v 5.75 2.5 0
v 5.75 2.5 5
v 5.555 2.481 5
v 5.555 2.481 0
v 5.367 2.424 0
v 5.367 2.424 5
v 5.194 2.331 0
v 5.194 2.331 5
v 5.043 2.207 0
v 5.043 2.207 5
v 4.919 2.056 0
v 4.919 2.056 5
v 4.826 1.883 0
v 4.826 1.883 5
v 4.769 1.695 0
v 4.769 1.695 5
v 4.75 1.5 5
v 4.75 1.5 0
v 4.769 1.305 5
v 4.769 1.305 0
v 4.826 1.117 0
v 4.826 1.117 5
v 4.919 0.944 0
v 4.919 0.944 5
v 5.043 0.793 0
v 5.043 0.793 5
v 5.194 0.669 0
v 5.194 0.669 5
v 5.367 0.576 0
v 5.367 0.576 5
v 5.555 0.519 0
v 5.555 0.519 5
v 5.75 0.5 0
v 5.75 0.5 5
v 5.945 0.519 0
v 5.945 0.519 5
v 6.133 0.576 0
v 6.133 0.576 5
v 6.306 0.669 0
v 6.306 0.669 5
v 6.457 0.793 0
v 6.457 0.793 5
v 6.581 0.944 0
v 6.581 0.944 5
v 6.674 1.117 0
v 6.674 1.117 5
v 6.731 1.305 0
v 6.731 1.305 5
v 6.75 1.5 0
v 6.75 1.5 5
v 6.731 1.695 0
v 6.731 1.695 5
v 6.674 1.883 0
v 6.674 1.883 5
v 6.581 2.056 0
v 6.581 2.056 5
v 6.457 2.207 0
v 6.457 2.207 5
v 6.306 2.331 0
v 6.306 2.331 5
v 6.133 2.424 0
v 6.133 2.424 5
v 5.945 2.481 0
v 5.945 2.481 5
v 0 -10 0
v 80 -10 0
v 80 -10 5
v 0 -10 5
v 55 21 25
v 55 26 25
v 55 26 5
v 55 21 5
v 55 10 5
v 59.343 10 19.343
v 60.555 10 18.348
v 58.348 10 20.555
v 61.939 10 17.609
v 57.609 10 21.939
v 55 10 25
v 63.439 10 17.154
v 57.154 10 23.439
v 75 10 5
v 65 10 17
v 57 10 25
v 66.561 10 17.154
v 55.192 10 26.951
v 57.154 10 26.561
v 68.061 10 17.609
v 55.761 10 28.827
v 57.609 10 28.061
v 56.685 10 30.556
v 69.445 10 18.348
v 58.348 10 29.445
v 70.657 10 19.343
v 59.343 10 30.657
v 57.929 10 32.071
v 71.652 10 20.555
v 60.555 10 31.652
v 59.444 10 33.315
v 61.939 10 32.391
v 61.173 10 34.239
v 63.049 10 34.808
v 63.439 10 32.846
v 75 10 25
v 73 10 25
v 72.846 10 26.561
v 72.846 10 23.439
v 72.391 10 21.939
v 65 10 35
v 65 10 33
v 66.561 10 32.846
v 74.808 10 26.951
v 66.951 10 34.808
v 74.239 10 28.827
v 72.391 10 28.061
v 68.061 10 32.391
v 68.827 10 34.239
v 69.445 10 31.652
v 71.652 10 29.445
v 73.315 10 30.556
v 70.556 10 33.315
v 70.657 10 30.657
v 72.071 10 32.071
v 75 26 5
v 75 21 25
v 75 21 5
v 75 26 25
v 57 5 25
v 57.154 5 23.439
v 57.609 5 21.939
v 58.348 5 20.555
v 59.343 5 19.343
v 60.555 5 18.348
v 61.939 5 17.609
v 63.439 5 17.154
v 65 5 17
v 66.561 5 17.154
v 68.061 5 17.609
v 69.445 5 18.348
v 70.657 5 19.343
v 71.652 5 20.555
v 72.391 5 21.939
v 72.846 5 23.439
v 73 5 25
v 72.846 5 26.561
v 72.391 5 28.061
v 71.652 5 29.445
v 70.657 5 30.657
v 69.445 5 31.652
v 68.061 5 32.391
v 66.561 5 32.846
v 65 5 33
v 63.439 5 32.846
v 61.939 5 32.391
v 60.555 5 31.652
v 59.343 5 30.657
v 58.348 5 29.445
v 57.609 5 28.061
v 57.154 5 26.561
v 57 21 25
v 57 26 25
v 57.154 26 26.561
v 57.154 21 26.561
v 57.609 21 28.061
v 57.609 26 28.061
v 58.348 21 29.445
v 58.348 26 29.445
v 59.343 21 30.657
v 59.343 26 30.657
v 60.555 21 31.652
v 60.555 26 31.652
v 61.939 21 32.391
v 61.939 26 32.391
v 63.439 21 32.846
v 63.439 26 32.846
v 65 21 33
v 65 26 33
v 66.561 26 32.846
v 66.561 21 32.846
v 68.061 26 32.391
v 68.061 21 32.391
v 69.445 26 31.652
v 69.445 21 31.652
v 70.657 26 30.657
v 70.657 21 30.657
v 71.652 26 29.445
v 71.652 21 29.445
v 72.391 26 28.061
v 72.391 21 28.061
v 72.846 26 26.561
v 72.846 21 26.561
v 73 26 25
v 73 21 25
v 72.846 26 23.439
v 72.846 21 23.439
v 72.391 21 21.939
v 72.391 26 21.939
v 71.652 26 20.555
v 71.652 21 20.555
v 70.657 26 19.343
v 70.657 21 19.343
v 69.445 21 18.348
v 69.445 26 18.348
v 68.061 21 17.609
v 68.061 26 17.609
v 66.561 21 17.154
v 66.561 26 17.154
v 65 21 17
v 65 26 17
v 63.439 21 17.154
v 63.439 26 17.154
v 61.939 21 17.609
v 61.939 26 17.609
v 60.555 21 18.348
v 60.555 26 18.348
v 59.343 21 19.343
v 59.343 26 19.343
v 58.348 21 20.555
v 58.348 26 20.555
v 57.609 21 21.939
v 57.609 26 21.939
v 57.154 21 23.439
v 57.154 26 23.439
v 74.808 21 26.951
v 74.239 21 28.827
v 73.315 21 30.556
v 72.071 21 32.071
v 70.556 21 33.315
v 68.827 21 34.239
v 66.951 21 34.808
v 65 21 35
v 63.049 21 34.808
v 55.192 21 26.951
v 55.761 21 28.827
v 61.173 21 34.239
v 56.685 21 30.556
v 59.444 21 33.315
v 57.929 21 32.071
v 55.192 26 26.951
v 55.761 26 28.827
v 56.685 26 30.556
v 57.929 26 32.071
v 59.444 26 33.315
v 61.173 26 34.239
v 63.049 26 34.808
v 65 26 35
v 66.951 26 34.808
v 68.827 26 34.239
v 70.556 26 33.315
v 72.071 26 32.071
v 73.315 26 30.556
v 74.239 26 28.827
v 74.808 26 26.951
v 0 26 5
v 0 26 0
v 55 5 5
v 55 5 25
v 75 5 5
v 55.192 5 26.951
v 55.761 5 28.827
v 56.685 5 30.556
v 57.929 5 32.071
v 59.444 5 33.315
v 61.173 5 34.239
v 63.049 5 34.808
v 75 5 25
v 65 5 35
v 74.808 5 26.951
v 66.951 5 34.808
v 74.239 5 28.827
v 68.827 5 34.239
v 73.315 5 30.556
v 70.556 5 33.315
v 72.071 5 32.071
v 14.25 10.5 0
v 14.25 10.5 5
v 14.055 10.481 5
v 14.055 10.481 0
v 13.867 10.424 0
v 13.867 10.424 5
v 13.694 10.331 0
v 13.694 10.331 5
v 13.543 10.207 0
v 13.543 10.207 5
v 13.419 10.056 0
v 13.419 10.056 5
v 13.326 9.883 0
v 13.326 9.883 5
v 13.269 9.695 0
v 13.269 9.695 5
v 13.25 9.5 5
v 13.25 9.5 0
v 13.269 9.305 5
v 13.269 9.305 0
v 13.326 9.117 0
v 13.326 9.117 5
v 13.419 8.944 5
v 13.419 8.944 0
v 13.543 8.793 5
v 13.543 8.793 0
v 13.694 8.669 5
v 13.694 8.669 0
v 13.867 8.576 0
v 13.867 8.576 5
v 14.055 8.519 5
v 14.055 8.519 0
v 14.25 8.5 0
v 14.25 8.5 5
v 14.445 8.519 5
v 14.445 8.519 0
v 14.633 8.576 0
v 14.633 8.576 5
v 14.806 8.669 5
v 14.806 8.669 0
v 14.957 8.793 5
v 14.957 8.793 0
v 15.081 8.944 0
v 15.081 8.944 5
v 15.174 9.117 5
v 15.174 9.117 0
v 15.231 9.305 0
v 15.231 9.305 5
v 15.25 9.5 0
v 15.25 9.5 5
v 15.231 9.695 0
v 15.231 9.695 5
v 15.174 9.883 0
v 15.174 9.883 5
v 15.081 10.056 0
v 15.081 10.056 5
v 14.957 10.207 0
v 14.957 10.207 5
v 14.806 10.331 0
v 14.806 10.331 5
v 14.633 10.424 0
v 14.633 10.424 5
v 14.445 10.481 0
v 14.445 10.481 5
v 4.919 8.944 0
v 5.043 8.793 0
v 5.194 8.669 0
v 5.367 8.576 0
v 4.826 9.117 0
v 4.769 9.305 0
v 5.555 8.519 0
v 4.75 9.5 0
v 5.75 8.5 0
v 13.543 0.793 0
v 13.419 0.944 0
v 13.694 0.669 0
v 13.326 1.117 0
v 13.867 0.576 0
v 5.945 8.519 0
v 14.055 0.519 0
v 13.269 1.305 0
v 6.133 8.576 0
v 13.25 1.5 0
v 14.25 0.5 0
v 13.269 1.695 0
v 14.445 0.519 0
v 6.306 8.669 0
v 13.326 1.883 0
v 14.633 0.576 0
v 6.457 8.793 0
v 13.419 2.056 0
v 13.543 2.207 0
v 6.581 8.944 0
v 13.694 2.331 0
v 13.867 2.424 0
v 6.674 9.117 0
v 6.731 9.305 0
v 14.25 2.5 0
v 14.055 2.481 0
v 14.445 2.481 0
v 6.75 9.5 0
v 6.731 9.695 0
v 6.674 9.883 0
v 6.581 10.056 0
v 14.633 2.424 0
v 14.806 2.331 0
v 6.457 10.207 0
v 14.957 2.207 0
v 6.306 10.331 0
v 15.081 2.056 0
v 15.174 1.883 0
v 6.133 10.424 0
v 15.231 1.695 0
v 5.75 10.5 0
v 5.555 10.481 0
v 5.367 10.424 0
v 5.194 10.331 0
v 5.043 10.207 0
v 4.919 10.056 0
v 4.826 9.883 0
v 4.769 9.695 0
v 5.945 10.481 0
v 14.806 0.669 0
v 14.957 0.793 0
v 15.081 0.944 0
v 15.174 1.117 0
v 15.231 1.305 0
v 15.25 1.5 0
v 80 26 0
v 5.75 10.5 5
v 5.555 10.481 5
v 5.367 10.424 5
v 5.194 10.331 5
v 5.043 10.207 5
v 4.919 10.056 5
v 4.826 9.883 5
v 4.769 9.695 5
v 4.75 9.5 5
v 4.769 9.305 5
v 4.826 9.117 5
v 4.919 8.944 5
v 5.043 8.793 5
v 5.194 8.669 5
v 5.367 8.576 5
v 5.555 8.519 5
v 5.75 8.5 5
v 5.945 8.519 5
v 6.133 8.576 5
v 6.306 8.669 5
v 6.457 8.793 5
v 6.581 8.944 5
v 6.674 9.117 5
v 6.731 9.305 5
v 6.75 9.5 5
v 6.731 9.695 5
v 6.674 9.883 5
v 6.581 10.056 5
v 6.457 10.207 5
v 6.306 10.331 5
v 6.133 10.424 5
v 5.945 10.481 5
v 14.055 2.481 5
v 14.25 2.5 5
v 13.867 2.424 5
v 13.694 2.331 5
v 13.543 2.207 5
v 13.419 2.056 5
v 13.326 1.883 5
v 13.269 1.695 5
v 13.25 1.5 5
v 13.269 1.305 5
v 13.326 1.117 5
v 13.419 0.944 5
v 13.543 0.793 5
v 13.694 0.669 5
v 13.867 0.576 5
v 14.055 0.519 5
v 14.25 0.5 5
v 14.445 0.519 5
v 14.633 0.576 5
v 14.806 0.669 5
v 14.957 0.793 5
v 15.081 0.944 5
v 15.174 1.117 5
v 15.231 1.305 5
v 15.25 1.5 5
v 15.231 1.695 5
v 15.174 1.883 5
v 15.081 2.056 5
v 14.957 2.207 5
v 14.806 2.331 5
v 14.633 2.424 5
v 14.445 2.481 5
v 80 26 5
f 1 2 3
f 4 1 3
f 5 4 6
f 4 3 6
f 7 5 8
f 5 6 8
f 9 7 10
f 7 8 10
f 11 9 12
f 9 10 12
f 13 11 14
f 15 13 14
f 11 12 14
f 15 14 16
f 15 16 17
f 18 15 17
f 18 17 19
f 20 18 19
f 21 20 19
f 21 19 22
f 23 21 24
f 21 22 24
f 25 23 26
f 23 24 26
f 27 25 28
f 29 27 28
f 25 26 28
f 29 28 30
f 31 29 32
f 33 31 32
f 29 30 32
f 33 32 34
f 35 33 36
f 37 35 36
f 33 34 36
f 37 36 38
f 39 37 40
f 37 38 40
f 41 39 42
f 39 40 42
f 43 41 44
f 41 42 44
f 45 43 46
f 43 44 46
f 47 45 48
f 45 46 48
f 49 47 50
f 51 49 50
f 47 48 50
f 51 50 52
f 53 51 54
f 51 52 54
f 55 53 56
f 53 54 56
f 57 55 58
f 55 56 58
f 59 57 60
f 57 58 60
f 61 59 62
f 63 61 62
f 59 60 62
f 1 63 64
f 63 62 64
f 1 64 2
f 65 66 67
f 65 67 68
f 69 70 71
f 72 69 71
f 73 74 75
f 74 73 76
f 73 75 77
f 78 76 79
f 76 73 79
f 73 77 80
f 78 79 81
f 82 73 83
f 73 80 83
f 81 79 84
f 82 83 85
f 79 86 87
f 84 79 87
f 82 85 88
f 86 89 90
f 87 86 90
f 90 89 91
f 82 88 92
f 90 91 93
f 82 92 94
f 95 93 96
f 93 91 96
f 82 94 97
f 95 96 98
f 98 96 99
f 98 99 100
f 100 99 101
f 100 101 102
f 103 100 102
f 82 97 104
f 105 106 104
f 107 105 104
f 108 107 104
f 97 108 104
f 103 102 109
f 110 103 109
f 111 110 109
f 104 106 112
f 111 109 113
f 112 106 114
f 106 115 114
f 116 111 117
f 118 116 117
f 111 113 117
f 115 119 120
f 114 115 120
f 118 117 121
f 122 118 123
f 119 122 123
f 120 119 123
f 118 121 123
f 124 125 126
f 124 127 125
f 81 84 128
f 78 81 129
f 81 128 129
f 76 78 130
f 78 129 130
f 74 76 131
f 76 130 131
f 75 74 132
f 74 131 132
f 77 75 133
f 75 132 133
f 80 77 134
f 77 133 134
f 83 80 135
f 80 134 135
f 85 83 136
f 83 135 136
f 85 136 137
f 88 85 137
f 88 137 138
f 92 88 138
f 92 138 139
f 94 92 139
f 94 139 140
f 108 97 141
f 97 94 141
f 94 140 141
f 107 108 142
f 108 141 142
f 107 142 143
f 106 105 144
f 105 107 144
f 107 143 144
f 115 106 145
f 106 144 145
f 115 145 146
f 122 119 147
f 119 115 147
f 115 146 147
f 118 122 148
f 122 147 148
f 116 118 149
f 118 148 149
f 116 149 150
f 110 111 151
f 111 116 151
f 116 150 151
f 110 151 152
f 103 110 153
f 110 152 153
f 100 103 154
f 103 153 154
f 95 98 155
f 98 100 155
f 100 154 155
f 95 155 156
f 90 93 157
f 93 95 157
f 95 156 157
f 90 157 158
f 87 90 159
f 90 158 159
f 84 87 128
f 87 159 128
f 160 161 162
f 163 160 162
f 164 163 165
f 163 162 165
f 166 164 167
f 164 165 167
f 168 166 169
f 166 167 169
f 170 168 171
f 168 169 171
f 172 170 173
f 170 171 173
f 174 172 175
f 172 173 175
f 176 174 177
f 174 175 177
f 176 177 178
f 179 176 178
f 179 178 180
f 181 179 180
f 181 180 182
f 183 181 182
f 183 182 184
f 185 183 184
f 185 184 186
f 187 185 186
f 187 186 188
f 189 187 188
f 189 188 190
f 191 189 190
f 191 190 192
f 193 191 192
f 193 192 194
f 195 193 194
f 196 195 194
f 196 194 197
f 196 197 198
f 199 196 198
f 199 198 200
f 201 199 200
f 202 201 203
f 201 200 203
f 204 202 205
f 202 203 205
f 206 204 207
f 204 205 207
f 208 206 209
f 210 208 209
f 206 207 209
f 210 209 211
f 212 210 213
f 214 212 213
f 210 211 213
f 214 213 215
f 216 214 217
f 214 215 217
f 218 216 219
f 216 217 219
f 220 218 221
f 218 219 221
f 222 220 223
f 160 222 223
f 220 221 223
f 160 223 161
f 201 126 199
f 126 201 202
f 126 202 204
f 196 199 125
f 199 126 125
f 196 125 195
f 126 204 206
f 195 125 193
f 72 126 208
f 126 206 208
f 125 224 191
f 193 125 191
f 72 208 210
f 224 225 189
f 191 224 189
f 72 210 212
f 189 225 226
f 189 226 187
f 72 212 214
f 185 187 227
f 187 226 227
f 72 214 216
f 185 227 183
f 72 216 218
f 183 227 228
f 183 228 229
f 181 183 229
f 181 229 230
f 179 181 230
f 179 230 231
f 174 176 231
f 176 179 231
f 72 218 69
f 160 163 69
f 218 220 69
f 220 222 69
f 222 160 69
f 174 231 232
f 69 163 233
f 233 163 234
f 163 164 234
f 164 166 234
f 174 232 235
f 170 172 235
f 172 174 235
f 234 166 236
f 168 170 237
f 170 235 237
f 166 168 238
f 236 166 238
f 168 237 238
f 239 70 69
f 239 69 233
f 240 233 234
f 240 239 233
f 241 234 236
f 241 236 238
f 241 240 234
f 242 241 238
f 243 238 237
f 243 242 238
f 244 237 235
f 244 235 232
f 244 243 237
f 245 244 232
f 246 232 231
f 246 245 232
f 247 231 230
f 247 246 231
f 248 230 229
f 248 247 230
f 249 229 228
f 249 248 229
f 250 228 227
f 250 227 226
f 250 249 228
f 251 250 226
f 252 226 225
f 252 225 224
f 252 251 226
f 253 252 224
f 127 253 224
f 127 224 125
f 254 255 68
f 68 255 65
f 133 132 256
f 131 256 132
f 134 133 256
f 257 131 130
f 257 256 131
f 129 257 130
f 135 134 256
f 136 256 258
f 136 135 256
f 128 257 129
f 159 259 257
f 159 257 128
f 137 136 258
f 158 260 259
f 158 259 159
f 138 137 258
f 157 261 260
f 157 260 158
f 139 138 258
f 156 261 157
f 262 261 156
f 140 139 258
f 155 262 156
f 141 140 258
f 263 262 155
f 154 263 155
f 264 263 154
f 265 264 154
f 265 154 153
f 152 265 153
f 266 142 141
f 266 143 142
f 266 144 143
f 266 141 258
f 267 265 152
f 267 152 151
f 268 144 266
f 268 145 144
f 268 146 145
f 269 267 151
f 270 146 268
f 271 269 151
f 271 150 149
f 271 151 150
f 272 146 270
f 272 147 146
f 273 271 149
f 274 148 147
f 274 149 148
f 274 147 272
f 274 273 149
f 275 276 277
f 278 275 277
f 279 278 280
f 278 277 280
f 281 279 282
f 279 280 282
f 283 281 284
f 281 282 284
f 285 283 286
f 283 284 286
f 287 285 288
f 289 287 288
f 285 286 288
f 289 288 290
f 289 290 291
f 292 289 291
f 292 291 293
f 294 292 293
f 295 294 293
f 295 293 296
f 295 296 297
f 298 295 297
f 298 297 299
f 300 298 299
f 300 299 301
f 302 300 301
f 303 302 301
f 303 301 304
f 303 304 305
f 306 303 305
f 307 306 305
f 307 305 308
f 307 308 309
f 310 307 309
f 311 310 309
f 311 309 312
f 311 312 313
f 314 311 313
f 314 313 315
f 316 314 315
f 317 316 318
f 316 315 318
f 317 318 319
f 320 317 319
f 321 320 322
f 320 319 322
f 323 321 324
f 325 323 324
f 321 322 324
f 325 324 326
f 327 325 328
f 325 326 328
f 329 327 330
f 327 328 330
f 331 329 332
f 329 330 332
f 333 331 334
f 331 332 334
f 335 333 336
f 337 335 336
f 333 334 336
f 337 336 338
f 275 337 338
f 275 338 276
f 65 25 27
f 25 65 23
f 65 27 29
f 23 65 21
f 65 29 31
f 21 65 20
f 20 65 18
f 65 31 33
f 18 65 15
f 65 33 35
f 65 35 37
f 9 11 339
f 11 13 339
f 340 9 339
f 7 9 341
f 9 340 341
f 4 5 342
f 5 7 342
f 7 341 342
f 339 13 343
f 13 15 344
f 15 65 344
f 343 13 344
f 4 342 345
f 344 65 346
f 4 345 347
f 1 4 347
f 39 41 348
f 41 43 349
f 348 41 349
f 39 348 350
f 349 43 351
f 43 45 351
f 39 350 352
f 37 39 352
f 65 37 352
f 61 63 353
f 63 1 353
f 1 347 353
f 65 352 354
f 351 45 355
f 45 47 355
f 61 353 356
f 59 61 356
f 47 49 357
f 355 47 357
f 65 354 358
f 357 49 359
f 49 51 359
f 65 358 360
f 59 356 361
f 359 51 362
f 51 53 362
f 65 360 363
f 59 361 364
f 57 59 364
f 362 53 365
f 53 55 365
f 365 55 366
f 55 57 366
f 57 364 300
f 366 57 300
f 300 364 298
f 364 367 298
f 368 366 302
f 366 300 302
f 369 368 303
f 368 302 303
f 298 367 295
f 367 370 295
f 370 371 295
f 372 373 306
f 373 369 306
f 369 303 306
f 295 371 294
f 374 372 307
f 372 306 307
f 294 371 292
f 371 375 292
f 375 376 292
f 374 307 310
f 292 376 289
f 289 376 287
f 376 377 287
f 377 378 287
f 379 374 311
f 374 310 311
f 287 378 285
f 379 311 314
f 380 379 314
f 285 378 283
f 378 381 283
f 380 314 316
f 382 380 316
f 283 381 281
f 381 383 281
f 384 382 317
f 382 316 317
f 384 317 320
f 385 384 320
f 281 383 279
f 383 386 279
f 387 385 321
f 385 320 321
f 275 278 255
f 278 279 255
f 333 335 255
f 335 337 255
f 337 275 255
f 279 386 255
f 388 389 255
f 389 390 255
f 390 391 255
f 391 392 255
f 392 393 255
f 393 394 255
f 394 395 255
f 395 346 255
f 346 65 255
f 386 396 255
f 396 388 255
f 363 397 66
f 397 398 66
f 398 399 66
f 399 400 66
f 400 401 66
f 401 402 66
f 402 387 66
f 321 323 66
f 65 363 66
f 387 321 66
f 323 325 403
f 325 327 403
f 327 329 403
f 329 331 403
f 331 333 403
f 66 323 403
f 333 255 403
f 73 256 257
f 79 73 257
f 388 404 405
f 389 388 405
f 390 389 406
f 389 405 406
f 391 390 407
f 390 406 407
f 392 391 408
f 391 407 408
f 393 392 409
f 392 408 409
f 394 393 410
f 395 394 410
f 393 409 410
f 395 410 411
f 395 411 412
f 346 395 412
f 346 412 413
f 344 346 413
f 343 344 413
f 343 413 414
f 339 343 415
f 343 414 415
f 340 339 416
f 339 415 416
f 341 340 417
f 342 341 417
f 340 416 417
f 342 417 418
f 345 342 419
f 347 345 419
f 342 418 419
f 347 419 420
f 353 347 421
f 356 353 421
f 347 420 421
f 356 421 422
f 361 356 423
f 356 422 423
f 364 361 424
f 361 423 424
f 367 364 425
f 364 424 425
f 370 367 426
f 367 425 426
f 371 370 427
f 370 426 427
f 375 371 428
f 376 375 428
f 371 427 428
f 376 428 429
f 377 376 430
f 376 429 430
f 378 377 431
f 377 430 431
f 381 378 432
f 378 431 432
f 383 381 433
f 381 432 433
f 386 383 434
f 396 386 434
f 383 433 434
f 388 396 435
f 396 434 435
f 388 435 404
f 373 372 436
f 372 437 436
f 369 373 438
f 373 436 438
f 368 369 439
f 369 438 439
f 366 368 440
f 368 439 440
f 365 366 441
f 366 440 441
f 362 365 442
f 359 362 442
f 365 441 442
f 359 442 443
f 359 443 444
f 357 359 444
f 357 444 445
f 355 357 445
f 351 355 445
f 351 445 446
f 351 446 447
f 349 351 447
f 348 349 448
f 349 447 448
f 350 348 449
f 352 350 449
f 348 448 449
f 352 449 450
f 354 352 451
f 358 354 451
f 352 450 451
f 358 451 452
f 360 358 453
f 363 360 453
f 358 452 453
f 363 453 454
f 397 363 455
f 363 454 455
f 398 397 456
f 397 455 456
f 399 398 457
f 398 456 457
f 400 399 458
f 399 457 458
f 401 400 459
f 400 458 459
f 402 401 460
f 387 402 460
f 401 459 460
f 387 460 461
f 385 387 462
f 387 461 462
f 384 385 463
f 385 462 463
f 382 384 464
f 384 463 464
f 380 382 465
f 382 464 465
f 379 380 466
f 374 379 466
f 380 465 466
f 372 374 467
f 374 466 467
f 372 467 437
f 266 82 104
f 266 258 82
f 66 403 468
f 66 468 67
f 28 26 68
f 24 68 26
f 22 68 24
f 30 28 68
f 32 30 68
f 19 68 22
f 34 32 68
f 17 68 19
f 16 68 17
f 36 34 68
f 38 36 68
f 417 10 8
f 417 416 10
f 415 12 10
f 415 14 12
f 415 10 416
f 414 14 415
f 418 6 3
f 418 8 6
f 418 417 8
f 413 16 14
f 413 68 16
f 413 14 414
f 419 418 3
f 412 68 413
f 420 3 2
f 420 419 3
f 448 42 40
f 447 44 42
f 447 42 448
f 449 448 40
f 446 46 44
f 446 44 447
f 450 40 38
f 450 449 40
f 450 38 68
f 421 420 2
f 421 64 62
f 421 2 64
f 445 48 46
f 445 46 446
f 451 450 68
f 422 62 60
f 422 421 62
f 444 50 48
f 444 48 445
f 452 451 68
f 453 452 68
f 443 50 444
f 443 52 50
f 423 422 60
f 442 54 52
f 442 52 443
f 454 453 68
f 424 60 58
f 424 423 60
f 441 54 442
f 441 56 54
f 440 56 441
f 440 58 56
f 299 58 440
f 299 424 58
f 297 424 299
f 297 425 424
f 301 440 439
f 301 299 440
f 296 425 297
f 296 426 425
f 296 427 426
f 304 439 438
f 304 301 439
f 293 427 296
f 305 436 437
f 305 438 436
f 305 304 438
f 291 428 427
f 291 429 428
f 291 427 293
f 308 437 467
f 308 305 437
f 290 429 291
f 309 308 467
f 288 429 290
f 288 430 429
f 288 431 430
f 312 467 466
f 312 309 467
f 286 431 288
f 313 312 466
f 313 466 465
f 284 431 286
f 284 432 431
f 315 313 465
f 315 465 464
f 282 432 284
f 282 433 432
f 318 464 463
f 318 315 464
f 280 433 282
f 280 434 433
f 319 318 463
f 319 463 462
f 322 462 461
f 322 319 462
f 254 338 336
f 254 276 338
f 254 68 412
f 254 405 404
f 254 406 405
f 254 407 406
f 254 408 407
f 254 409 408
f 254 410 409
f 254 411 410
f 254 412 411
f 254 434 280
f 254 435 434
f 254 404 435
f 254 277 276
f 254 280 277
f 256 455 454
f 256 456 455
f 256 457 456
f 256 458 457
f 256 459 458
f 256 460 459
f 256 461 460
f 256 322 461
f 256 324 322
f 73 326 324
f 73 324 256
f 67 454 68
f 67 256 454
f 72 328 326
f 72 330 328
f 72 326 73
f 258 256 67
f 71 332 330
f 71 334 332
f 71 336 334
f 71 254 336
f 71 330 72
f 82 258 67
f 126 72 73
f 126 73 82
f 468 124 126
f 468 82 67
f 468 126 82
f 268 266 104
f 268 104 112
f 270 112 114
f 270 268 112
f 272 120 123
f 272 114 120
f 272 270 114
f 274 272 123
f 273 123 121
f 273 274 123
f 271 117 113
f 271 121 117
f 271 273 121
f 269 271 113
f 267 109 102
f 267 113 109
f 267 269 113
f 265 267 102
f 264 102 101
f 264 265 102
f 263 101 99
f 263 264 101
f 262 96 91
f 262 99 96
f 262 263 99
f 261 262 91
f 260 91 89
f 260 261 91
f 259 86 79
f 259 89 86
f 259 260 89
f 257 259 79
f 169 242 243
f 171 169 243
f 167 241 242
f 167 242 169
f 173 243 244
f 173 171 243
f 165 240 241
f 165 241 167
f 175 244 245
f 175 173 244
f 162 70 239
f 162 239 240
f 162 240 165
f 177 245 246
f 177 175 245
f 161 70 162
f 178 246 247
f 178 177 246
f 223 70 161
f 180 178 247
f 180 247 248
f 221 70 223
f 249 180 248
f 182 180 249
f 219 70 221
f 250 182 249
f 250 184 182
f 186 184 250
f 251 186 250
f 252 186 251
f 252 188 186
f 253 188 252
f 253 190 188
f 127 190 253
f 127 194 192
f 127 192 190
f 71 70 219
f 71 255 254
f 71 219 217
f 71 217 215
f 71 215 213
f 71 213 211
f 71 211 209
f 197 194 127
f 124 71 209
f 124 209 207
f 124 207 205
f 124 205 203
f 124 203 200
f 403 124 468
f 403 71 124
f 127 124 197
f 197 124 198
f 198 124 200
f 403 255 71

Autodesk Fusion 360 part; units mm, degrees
sketch "Sketch1" plane through (0, 0, 0) normal (0, 0, 1) x (1, 0, 0)
  line L0 (0, 0) -> (20, 0)
  line L1 (20, 0) -> (20, 11)
  line L2 (20, 11) -> (0, 11)
  line L3 (0, 11) -> (0, 0)
  line L4 (0, 0) -> (80, 0)
  line L5 (0, 11) -> (0, 26)
  line L6 (0, 26) -> (80, 26)
  line L7 (80, 26) -> (80, 0)
  line L8 (80, 0) -> (0, 0)
  line L9 (0, 0) -> (0, 26)
  line L10 (80, 0) -> (80, -10)
  line L11 (80, -10) -> (0, -10)
  line L12 (0, -10) -> (0, 0)
  point P0 (5.75, 9.5)
  point P1 (14.25, 9.5)
  point P2 (14.25, 1.5)
  point P3 (5.75, 1.5)
  dimension "d1" = 20
  dimension "d2" = 11
  dimension "d3" = 1.5
  dimension "d4" = 1.5
  dimension "d5" = 8.5
  dimension "d6" = 5.75
  dimension "d7" = 80
  dimension "d8" = 15
  dimension "d19" = 10
extrude "Extrude1" add sketch "Sketch1" along normal blind 5
hole "Hole1" at (14.25, 1.5, 0) direction (0, 0, 1) diameter 2 end through all
pattern_linear "R-Pattern1" count 2 spacing 8.5 along (-1, 0, 0) count 2 spacing 8 along (0, 1, 0) of "Hole1"
sketch "Sketch2" plane through (0, 26, 0) normal (0, 1, 0) x (-1, 0, 0)
  line L0 (-80, 0) -> (0, 0)
  line L1 (0, 0) -> (0, 5)
  line L2 (0, 5) -> (-80, 5)
  line L3 (-80, 5) -> (-80, 0)
  circle A0 centre (-65, 25) radius 8
  line L4 (-73, 25) -> (-73, 5)
  line L5 (-57, 25) -> (-57, 5)
  line L6 (-57, 5) -> (-73, 5)
  circle A1 centre (-65, 25) radius 10
  line L7 (-75, 25) -> (-75, 5)
  line L8 (-55, 25) -> (-55, 5)
  dimension "d24" = 16
  dimension "d25" = 7
  dimension "d27" = 20
  dimension "d28" = 2
  dimension "d29" = 2
  dimension "d30" = -2
extrude "Extrude2" add sketch "Sketch2" against normal blind 5 contours L2 L4 A1 L7 | L2 L5 A1 L8 | L2 L4 L5 L6 A1 | A0 L4 L5 A1 | A0 L4 L5 A1
ref_plane "WorkPlane2" through (65, 15.5, 20) normal (0, -1, 0) x (1, 0, 0)
mirror "Mirror1" about plane through (65, 15.5, 20) normal (0, -1, 0) of "Extrude2"
equation "d33 = ( 11 / 2 ) * 1 mm"
